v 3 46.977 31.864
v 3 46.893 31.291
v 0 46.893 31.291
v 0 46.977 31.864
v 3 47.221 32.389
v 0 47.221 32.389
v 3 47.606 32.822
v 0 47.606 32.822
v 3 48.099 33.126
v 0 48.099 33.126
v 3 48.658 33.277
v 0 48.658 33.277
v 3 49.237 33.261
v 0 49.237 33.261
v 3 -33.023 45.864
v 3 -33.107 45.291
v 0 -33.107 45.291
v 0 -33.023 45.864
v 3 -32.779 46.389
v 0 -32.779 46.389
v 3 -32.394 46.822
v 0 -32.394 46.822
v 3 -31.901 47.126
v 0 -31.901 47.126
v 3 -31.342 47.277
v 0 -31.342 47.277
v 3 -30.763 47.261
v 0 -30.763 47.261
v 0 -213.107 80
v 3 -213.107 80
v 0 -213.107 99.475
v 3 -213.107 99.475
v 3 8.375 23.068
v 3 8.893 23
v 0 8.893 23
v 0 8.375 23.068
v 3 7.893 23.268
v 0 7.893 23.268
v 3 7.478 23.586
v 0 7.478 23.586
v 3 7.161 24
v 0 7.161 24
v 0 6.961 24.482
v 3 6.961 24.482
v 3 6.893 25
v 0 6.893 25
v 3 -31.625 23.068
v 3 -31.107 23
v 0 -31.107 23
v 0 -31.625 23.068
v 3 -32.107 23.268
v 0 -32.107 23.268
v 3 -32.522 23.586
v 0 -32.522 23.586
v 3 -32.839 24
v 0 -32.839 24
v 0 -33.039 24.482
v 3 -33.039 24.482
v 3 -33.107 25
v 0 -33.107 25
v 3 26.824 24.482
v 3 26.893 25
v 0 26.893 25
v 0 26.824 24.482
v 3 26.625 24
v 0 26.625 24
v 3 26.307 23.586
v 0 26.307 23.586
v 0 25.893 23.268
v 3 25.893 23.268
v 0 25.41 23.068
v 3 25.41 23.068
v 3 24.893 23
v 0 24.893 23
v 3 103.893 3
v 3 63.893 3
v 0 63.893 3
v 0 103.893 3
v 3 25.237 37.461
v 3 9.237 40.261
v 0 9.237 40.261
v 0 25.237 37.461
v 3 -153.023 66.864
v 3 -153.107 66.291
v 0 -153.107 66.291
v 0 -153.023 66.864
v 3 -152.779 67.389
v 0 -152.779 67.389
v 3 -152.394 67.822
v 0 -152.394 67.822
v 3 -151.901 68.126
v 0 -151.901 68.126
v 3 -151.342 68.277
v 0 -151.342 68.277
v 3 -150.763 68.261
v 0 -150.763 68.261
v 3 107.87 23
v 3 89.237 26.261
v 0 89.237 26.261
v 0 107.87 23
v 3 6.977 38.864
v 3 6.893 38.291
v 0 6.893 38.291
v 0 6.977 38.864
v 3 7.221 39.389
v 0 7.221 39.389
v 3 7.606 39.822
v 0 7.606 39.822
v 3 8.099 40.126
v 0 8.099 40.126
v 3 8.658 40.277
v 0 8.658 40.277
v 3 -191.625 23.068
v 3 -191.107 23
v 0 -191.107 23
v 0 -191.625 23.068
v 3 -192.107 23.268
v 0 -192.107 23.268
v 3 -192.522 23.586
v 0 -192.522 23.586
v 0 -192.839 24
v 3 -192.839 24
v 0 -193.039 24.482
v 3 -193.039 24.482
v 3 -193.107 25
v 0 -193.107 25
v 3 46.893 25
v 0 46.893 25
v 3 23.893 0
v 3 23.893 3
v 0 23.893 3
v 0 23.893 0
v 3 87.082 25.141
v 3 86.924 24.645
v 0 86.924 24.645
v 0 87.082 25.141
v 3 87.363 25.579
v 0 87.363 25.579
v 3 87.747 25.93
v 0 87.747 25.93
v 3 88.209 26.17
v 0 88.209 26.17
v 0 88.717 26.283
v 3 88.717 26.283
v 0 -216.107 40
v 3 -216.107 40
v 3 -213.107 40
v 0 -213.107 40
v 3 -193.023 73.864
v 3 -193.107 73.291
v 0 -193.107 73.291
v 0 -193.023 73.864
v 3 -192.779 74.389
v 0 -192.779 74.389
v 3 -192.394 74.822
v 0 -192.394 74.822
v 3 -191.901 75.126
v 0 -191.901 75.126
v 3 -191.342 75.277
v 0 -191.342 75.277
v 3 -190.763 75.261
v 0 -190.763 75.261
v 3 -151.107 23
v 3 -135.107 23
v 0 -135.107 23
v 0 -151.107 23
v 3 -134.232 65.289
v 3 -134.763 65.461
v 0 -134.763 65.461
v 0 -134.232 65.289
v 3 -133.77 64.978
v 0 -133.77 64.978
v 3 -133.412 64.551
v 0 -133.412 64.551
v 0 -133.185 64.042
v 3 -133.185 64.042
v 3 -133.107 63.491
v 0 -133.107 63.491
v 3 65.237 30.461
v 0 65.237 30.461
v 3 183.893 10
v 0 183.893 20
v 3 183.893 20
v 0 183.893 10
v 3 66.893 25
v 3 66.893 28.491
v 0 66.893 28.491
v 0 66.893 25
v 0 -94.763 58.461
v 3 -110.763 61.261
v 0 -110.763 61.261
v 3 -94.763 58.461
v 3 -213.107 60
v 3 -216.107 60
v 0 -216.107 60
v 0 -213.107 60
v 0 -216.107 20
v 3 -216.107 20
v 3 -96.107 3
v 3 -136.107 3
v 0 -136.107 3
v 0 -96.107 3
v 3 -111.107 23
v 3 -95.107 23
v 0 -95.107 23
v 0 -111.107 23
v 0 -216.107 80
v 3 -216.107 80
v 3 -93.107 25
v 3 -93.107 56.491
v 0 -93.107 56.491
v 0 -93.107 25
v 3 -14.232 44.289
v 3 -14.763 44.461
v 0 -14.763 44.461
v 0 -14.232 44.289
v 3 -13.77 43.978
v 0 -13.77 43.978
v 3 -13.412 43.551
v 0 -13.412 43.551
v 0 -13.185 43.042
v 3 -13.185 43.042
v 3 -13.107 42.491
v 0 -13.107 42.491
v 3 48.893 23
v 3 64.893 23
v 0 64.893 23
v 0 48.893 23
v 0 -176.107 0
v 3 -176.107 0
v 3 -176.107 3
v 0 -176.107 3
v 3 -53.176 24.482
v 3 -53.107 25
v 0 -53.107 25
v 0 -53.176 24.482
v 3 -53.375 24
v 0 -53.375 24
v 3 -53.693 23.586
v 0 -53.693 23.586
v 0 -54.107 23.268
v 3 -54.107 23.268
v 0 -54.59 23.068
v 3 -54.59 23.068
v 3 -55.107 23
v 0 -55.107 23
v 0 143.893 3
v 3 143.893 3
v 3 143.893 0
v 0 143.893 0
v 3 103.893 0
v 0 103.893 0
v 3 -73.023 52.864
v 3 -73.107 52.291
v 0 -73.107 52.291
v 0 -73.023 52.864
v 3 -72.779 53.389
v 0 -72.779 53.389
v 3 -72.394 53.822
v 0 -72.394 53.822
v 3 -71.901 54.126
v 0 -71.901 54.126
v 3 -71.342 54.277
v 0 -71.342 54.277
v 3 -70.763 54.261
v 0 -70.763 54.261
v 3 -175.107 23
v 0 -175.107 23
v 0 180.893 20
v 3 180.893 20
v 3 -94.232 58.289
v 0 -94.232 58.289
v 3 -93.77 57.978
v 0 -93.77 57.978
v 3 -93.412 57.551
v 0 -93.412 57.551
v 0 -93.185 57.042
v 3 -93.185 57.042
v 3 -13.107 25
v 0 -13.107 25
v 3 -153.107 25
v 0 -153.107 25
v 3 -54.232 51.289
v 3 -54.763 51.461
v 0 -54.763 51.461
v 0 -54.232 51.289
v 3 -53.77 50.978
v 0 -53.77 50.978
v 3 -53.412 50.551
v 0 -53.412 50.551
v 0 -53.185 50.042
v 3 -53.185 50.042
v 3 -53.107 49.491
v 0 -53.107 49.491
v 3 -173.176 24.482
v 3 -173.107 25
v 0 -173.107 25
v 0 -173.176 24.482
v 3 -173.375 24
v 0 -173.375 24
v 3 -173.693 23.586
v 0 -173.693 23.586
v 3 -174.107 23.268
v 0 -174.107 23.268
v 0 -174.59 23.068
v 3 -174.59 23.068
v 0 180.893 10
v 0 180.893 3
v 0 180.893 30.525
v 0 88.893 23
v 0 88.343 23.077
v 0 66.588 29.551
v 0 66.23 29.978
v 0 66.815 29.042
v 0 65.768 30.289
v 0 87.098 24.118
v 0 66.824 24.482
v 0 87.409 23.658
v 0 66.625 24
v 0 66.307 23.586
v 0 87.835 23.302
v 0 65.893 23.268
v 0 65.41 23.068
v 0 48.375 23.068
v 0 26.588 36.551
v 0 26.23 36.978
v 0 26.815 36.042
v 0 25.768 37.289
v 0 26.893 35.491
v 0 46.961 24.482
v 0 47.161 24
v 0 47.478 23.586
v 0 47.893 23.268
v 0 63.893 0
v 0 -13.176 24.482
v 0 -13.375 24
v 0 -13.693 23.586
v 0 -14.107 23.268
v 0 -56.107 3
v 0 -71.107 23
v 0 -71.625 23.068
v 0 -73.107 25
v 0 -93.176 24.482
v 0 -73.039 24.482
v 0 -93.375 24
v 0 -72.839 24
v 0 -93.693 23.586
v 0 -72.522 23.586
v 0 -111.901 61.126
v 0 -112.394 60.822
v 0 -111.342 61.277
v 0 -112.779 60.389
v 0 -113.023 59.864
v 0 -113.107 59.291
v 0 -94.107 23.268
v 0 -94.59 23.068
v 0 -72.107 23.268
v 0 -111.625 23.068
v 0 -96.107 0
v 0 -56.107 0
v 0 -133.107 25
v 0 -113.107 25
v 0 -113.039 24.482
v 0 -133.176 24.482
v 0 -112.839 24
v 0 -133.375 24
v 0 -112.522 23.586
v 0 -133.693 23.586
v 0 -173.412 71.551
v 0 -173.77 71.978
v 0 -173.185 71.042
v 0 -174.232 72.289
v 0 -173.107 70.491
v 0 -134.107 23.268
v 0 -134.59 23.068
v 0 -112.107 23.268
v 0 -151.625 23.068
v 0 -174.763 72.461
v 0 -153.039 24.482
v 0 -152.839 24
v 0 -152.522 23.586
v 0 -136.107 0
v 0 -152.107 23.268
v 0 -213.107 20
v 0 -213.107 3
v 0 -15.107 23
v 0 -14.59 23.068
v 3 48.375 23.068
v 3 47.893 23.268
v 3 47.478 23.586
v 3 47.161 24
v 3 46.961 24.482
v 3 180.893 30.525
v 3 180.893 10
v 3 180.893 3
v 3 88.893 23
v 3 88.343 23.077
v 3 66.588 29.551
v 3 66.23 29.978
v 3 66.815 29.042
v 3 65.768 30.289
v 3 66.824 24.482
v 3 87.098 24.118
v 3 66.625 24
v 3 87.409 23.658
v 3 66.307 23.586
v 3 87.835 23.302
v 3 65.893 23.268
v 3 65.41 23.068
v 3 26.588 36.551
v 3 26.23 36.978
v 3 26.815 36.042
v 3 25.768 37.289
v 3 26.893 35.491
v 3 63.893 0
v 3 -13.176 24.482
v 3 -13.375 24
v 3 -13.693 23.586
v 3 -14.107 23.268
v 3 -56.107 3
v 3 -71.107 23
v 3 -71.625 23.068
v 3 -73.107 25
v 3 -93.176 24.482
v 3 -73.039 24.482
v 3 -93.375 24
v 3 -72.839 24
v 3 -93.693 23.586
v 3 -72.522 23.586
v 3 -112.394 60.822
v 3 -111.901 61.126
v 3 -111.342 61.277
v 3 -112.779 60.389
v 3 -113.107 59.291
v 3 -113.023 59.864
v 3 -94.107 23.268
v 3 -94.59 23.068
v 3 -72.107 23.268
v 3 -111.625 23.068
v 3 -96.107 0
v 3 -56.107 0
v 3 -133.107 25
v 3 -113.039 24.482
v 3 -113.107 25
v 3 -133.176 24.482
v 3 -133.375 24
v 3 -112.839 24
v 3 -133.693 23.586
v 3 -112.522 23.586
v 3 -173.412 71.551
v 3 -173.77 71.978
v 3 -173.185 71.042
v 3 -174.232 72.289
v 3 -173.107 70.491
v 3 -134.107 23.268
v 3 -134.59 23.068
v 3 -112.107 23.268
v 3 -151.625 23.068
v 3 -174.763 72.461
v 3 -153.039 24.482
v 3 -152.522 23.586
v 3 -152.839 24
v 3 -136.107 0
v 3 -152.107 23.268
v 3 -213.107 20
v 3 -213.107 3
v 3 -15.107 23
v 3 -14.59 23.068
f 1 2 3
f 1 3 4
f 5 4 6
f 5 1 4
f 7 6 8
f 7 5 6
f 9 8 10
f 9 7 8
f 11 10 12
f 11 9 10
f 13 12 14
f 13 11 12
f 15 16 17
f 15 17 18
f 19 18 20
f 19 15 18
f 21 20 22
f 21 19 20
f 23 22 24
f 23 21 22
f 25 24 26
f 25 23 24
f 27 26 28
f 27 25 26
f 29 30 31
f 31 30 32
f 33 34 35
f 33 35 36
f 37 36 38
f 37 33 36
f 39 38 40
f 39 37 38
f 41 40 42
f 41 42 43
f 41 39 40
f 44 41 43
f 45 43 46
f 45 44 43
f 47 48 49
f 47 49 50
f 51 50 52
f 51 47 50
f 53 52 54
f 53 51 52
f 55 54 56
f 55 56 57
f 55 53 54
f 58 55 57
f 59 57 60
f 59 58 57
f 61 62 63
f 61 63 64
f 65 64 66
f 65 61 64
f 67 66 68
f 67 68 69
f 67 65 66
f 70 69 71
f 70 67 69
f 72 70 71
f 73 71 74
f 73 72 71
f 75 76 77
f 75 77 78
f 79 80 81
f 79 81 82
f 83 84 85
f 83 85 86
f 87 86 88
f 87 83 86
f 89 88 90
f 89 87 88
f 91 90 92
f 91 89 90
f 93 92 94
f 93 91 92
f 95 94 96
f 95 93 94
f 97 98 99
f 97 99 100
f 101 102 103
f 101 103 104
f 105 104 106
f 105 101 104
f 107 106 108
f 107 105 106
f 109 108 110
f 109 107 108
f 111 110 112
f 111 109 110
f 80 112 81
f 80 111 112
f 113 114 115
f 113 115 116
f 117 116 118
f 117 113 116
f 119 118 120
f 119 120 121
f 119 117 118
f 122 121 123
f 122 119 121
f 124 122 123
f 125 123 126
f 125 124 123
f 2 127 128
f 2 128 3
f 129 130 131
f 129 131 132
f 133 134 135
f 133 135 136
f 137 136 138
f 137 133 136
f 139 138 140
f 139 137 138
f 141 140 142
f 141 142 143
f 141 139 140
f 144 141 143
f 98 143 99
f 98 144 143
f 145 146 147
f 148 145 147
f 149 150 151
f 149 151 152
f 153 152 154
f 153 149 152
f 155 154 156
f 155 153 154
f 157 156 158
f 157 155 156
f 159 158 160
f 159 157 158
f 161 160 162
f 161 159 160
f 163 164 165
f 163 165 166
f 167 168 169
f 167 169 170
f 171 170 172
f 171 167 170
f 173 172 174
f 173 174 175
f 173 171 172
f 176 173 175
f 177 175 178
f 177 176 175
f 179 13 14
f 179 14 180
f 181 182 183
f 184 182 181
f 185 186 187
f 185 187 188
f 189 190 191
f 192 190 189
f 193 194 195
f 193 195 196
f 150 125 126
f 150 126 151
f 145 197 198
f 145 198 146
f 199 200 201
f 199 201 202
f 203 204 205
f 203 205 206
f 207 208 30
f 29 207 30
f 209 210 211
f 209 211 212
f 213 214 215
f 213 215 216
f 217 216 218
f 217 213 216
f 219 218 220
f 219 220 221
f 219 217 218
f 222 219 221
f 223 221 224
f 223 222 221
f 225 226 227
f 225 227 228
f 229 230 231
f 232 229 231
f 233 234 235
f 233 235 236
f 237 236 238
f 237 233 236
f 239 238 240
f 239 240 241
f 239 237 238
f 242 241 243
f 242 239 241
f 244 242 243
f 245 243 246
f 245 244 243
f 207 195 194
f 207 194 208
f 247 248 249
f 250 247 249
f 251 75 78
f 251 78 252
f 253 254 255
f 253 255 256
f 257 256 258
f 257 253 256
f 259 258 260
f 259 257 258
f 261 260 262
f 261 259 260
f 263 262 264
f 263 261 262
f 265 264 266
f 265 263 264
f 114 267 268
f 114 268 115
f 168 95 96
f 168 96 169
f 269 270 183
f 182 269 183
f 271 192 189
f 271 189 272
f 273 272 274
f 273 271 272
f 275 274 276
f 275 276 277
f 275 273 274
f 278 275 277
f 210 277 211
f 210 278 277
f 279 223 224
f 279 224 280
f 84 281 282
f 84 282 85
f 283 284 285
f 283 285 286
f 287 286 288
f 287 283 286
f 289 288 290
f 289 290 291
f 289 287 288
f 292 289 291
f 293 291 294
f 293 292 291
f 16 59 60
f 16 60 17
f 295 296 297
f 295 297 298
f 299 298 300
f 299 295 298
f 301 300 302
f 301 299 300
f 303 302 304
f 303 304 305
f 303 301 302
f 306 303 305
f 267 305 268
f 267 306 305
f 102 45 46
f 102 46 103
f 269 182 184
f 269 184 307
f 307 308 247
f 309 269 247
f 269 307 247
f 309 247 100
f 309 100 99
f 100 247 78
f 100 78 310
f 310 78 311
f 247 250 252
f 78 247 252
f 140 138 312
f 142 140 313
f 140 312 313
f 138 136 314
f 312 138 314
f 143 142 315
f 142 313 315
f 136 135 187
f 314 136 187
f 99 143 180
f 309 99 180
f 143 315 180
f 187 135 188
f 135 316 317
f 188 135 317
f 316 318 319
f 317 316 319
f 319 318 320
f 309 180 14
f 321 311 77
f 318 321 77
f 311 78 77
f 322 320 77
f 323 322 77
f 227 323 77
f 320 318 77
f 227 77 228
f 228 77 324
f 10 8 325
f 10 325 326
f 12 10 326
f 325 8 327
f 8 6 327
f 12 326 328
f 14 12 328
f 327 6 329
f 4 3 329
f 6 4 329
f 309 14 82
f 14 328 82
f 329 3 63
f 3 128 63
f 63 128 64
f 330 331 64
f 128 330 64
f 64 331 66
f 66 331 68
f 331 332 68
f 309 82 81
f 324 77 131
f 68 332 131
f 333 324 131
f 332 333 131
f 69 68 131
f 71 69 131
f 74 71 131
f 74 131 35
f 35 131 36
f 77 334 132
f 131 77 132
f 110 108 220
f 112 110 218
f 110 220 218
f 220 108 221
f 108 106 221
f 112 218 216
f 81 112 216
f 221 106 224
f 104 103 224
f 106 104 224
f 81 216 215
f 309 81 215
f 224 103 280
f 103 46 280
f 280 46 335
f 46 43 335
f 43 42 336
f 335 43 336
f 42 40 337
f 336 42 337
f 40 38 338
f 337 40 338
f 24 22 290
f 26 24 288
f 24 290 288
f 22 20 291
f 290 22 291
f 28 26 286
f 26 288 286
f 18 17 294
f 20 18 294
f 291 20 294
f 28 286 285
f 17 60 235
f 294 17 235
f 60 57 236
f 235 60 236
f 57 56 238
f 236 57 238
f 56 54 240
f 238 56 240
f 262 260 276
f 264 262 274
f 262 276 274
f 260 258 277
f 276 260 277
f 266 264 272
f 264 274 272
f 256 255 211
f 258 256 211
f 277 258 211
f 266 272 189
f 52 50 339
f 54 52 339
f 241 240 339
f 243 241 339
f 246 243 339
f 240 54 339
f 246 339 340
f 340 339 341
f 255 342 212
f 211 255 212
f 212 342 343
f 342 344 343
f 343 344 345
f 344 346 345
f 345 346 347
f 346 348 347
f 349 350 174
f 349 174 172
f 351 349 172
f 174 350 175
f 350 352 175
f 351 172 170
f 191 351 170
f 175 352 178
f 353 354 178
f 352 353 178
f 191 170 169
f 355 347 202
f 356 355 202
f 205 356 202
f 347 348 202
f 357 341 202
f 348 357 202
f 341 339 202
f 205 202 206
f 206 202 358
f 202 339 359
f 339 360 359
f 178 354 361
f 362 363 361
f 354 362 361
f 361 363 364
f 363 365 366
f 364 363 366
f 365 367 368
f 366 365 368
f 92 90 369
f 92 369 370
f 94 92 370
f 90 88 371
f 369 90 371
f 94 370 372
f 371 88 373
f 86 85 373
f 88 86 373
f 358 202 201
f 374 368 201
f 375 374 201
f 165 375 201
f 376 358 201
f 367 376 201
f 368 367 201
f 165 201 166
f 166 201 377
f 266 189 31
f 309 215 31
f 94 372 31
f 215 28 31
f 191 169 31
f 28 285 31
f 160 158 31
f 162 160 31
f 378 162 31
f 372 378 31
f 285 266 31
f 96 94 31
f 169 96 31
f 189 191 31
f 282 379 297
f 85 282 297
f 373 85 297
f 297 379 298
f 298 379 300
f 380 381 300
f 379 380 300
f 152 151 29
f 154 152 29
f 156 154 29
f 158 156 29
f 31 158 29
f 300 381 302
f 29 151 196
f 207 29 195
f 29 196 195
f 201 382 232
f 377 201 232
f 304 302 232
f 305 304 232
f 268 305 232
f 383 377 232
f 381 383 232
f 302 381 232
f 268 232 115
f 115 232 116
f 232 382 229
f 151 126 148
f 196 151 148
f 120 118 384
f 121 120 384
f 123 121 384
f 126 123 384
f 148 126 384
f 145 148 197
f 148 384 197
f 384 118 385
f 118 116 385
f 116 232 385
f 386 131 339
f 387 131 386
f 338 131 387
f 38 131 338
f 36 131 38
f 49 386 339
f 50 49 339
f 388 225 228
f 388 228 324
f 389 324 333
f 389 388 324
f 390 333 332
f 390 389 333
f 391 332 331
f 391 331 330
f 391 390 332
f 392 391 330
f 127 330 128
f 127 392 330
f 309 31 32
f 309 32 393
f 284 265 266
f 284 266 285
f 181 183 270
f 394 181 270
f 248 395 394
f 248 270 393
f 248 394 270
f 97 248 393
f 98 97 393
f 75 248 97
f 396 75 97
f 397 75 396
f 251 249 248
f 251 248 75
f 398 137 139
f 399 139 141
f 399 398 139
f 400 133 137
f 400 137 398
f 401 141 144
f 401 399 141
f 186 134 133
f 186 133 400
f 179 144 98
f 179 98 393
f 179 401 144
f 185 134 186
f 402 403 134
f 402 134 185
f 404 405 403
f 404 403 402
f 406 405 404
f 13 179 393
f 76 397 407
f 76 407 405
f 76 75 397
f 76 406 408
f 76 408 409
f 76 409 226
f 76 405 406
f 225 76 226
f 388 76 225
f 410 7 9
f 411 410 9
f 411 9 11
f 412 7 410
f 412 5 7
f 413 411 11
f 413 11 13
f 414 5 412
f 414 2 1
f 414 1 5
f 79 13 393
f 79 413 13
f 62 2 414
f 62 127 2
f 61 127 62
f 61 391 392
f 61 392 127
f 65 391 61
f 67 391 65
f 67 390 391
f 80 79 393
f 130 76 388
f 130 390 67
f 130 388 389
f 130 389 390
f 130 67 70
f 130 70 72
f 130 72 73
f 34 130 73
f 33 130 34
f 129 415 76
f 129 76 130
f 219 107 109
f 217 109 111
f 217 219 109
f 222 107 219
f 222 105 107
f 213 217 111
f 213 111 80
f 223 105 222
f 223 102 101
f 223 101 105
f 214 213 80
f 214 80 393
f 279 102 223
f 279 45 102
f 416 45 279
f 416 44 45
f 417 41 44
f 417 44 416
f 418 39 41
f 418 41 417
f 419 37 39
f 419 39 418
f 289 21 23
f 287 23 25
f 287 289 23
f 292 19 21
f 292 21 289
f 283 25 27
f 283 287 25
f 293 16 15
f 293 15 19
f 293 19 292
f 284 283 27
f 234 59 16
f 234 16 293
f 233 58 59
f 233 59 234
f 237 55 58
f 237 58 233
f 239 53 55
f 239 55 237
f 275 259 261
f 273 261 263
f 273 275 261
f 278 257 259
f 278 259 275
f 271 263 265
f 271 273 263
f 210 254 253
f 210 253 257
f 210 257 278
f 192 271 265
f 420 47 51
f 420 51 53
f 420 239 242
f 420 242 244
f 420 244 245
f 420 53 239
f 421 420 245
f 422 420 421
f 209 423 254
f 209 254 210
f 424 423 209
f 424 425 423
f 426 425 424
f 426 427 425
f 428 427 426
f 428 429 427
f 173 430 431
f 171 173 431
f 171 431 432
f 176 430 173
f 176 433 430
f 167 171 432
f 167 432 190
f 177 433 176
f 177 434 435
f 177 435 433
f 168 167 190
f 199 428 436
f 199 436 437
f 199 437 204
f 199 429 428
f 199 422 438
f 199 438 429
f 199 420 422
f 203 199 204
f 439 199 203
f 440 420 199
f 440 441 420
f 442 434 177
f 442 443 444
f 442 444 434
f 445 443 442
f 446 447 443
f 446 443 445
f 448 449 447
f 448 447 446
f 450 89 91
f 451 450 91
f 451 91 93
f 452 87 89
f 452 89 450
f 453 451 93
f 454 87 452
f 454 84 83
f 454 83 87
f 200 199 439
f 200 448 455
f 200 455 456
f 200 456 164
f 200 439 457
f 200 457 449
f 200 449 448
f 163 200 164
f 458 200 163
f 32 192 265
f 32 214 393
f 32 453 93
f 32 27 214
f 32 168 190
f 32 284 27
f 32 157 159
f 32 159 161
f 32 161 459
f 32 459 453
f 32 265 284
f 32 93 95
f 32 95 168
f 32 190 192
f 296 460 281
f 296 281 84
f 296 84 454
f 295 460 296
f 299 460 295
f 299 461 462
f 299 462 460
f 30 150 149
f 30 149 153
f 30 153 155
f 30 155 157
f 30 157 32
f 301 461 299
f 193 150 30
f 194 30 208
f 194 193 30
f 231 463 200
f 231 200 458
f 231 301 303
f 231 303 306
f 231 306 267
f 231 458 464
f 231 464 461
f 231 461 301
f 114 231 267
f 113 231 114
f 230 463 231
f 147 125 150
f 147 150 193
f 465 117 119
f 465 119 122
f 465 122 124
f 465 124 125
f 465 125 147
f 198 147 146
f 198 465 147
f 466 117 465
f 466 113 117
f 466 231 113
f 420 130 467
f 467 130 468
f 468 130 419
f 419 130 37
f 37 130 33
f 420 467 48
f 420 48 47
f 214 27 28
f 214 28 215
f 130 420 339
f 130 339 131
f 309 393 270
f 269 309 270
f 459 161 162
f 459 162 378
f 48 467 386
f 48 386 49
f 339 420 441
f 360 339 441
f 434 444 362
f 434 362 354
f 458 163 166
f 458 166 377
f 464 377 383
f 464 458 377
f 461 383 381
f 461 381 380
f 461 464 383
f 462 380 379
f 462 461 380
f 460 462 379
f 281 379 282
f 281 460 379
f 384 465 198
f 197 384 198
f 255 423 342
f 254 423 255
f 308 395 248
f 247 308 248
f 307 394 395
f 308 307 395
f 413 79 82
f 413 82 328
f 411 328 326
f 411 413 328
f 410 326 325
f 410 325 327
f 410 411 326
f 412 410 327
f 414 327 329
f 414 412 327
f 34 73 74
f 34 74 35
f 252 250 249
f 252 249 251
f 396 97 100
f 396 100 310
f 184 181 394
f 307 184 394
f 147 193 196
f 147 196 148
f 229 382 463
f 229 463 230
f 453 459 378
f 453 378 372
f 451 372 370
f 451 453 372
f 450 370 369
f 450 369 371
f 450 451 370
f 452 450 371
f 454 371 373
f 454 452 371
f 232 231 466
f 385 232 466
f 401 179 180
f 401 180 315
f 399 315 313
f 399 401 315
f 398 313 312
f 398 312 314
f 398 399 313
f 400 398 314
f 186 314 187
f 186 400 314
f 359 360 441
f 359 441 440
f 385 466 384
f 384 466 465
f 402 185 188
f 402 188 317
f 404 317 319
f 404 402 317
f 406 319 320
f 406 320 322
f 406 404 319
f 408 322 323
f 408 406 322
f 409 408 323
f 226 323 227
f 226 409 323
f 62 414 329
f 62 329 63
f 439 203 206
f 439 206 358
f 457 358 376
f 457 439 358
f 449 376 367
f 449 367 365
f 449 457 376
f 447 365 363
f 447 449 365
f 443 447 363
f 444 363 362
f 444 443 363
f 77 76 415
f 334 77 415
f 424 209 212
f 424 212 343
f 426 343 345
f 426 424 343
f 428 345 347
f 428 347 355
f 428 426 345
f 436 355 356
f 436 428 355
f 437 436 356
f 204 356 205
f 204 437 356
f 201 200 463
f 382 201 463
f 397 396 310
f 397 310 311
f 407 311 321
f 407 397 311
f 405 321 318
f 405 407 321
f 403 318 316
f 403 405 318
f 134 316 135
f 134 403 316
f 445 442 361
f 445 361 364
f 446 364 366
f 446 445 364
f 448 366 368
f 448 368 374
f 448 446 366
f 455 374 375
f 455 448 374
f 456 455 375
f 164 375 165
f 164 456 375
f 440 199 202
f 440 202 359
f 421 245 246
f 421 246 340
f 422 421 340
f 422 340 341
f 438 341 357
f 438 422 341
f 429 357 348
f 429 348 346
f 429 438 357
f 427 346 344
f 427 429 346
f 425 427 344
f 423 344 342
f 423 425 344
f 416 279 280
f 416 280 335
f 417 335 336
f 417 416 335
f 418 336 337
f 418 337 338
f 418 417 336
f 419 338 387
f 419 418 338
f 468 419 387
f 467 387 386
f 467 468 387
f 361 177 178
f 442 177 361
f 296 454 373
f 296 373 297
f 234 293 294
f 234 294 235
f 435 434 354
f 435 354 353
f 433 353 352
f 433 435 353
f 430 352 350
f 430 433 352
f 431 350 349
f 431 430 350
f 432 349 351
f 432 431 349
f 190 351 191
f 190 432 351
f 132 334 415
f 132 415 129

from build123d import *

# Parameters (mm, degrees)
BOSS_EXTRUDE1_DEPTH = 3
SKETCH2_W           = 20
SKETCH2_H           = 3
SKETCH2_W_2         = 3
SKETCH2_H_2         = 40
SKETCH2_H_3         = 80
CUT_EXTRUDE1_DEPTH  = 3
CUT_EXTRUDE2_DEPTH  = 3
FILLET1_R           = 2


with BuildPart() as part:
    # Sketch1 → Boss-Extrude1 (new body)
    with BuildSketch(Plane(origin=(0, 0, 0), x_dir=(0, 0, -1), z_dir=(1, 0, 0))):
        Polygon((0, 183.89261745), (0, -216.10738255), (-100, -216.10738255), (-30, 183.89261745), align=None)
    extrude(amount=BOSS_EXTRUDE1_DEPTH)

    # Sketch2 → Cut-Extrude1 (cut)
    with BuildSketch(Plane(origin=(3, 0, 0), x_dir=(0, 0, -1), z_dir=(1, 0, 0))):
        Polygon((-80, -213.10738255), (-99.475, -213.10738255), (-100, -216.10738255), (-80, -216.10738255), align=None)
        Polygon((-30, 183.89261745), (-30.525, 180.89261745), (-20, 180.89261745), (-20, 183.89261745), align=None)
        with Locations((-50, -214.60738255)):
            Rectangle(SKETCH2_W, SKETCH2_H)
        Polygon((-3, -213.10738255), (-20, -213.10738255), (-20, -216.10738255), (0, -216.10738255), (0, -176.10738255), (-3, -176.10738255), align=None)
        Polygon((-10, 183.89261745), (-10, 180.89261745), (-3, 180.89261745), (-3, 143.89261745), (0, 143.89261745), (0, 183.89261745), align=None)
        with Locations((-1.5, -116.10738255)):
            Rectangle(SKETCH2_W_2, SKETCH2_H_2)
        with Locations((-1.5, 83.89261745)):
            Rectangle(SKETCH2_W_2, SKETCH2_H_2)
        with Locations((-1.5, -16.10738255)):
            Rectangle(SKETCH2_W_2, SKETCH2_H_3)
    extrude(amount=-CUT_EXTRUDE1_DEPTH, mode=Mode.SUBTRACT)

    # Sketch3 → Cut-Extrude2 (cut)
    with BuildSketch(Plane(origin=(3, 0, 0), x_dir=(0, 0, -1), z_dir=(1, 0, 0))):
        Polygon((-68.671059496, -153.10738255), (-65.171059496, -133.10738255), (-23, -133.10738255), (-23, -153.10738255), align=None)
        Polygon((-23, -173.10738255), (-23, -193.10738255), (-75.671059496, -193.10738255), (-72.171059496, -173.10738255), align=None)
        Polygon((-61.671059496, -113.10738255), (-58.171059496, -93.10738255), (-23, -93.10738255), (-23, -113.10738255), align=None)
        Polygon((-54.671059496, -73.10738255), (-51.171059496, -53.10738255), (-23, -53.10738255), (-23, -73.10738255), align=None)
        Polygon((-23, 107.870100283), (-23, 86.89261745), (-26.671059496, 86.89261745), align=None)
        Polygon((-23, -33.10738255), (-47.671059496, -33.10738255), (-44.171059496, -13.10738255), (-23, -13.10738255), align=None)
        Polygon((-23, 6.89261745), (-40.671059496, 6.89261745), (-37.171059496, 26.89261745), (-23, 26.89261745), align=None)
        Polygon((-23, 46.89261745), (-33.671059496, 46.89261745), (-30.171059496, 66.89261745), (-23, 66.89261745), align=None)
    extrude(amount=-CUT_EXTRUDE2_DEPTH, mode=Mode.SUBTRACT)

    # Fillet1
    # the kernel refuses this fillet: 2 mm, written as the material it adds along each edge
    with BuildSketch(Plane(origin=(3, 86.89261745, 26.671059496), x_dir=(0, 0, -1), z_dir=(-1, 0, 0)), Plane(origin=(3, 46.89261745, 33.671059496), x_dir=(0, 0, -1), z_dir=(-1, 0, 0)), Plane(origin=(3, 6.89261745, 40.671059496), x_dir=(0, 0, -1), z_dir=(-1, 0, 0)), Plane(origin=(3, -33.10738255, 47.671059496), x_dir=(0, 0, -1), z_dir=(-1, 0, 0)), Plane(origin=(3, -193.10738255, 75.671059496), x_dir=(0, 0, -1), z_dir=(-1, 0, 0))) as fillet1_piece_1:
        with BuildLine():
            CenterArc((FILLET1_R * 1.19019702521, -FILLET1_R), FILLET1_R, 90, 99.926245507)
            Line((FILLET1_R * 0.205166558057, -FILLET1_R * 1.17238033175), (0, 0))
            Line((0, 0), (FILLET1_R * 1.19019702521, 0))
        make_face()
    extrude(amount=3)
    with BuildSketch(Plane(origin=(3, 86.89261745, 23), x_dir=(0, 1, 0), z_dir=(-1, 0, 0)), Plane(origin=(3, 66.89261745, 23), x_dir=(0, 0, 1), z_dir=(-1, 0, 0)), Plane(origin=(3, 26.89261745, 23), x_dir=(0, 0, 1), z_dir=(-1, 0, 0)), Plane(origin=(3, -13.10738255, 23), x_dir=(0, 0, 1), z_dir=(-1, 0, 0)), Plane(origin=(3, -93.10738255, 23), x_dir=(0, 0, 1), z_dir=(-1, 0, 0)), Plane(origin=(3, -73.10738255, 23), x_dir=(0, 1, 0), z_dir=(-1, 0, 0)), Plane(origin=(3, -53.10738255, 23), x_dir=(0, 0, 1), z_dir=(-1, 0, 0)), Plane(origin=(3, -133.10738255, 23), x_dir=(0, 0, 1), z_dir=(-1, 0, 0)), Plane(origin=(3, -113.10738255, 23), x_dir=(0, 1, 0), z_dir=(-1, 0, 0)), Plane(origin=(3, -153.10738255, 23), x_dir=(0, 1, 0), z_dir=(-1, 0, 0)), Plane(origin=(3, -193.10738255, 23), x_dir=(0, 1, 0), z_dir=(-1, 0, 0))) as fillet1_piece_2:
        with BuildLine():
            CenterArc((FILLET1_R, -FILLET1_R), FILLET1_R, 90, 90)
            Line((0, -FILLET1_R), (0, 0))
            Line((0, 0), (FILLET1_R, 0))
        make_face()
    extrude(amount=3)
    with BuildSketch(Plane(origin=(3, 66.89261745, 30.171059496), x_dir=(0, -0.985030467155704, 0.17238033175224968), z_dir=(-1, 0, 0)), Plane(origin=(3, 26.89261745, 37.171059496), x_dir=(0, -0.9850304671557044, 0.172380331752247), z_dir=(-1, 0, 0)), Plane(origin=(3, -13.10738255, 44.171059496), x_dir=(0, -0.9850304671557039, 0.1723803317522504), z_dir=(-1, 0, 0)), Plane(origin=(3, -53.10738255, 51.171059496), x_dir=(0, -0.9850304671557039, 0.1723803317522504), z_dir=(-1, 0, 0)), Plane(origin=(3, -93.10738255, 58.171059496), x_dir=(0, -0.9850304671557047, 0.17238033175224557), z_dir=(-1, 0, 0)), Plane(origin=(3, -133.10738255, 65.171059496), x_dir=(0, -0.9850304671557039, 0.17238033175224987), z_dir=(-1, 0, 0)), Plane(origin=(3, -173.10738255, 72.171059496), x_dir=(0, -0.9850304671557039, 0.17238033175224987), z_dir=(-1, 0, 0))) as fillet1_piece_3:
        with BuildLine():
            CenterArc((FILLET1_R * 0.840197025212, -FILLET1_R), FILLET1_R, 90, 80.073754493)
            Line((-FILLET1_R * 0.144833441943, -FILLET1_R * 0.827619668248), (0, 0))
            Line((0, 0), (FILLET1_R * 0.840197025212, 0))
        make_face()
    extrude(amount=3)
    with BuildSketch(Plane(origin=(3, 46.89261745, 23), x_dir=(0, 0, 1), z_dir=(-1, 0, 0)), Plane(origin=(3, 6.89261745, 23), x_dir=(0, 0, 1), z_dir=(-1, 0, 0)), Plane(origin=(3, -33.10738255, 23), x_dir=(0, 0, 1), z_dir=(-1, 0, 0)), Plane(origin=(3, -173.10738255, 23), x_dir=(0, -1, 0), z_dir=(-1, 0, 0))) as fillet1_piece_4:
        with BuildLine():
            CenterArc((FILLET1_R, FILLET1_R), FILLET1_R, 180, 90)
            Line((0, FILLET1_R), (0, 0))
            Line((0, 0), (FILLET1_R, 0))
        make_face()
    extrude(amount=3)
    with BuildSketch(Plane(origin=(3, -73.10738255, 54.671059496), x_dir=(0, 0.985030467155704, -0.17238033175224923), z_dir=(-1, 0, 0)), Plane(origin=(3, -113.10738255, 61.671059496), x_dir=(0, 0.9850304671557042, -0.17238033175224837), z_dir=(-1, 0, 0)), Plane(origin=(3, -153.10738255, 68.671059496), x_dir=(0, 0.9850304671557039, -0.17238033175225026), z_dir=(-1, 0, 0))) as fillet1_piece_5:
        with BuildLine():
            CenterArc((FILLET1_R * 1.19019702521, FILLET1_R), FILLET1_R, 170.073754493, 99.926245507)
            Line((FILLET1_R * 0.205166558057, FILLET1_R * 1.17238033175), (0, 0))
            Line((0, 0), (FILLET1_R * 1.19019702521, 0))
        make_face()
    extrude(amount=3)


solid = part.part
